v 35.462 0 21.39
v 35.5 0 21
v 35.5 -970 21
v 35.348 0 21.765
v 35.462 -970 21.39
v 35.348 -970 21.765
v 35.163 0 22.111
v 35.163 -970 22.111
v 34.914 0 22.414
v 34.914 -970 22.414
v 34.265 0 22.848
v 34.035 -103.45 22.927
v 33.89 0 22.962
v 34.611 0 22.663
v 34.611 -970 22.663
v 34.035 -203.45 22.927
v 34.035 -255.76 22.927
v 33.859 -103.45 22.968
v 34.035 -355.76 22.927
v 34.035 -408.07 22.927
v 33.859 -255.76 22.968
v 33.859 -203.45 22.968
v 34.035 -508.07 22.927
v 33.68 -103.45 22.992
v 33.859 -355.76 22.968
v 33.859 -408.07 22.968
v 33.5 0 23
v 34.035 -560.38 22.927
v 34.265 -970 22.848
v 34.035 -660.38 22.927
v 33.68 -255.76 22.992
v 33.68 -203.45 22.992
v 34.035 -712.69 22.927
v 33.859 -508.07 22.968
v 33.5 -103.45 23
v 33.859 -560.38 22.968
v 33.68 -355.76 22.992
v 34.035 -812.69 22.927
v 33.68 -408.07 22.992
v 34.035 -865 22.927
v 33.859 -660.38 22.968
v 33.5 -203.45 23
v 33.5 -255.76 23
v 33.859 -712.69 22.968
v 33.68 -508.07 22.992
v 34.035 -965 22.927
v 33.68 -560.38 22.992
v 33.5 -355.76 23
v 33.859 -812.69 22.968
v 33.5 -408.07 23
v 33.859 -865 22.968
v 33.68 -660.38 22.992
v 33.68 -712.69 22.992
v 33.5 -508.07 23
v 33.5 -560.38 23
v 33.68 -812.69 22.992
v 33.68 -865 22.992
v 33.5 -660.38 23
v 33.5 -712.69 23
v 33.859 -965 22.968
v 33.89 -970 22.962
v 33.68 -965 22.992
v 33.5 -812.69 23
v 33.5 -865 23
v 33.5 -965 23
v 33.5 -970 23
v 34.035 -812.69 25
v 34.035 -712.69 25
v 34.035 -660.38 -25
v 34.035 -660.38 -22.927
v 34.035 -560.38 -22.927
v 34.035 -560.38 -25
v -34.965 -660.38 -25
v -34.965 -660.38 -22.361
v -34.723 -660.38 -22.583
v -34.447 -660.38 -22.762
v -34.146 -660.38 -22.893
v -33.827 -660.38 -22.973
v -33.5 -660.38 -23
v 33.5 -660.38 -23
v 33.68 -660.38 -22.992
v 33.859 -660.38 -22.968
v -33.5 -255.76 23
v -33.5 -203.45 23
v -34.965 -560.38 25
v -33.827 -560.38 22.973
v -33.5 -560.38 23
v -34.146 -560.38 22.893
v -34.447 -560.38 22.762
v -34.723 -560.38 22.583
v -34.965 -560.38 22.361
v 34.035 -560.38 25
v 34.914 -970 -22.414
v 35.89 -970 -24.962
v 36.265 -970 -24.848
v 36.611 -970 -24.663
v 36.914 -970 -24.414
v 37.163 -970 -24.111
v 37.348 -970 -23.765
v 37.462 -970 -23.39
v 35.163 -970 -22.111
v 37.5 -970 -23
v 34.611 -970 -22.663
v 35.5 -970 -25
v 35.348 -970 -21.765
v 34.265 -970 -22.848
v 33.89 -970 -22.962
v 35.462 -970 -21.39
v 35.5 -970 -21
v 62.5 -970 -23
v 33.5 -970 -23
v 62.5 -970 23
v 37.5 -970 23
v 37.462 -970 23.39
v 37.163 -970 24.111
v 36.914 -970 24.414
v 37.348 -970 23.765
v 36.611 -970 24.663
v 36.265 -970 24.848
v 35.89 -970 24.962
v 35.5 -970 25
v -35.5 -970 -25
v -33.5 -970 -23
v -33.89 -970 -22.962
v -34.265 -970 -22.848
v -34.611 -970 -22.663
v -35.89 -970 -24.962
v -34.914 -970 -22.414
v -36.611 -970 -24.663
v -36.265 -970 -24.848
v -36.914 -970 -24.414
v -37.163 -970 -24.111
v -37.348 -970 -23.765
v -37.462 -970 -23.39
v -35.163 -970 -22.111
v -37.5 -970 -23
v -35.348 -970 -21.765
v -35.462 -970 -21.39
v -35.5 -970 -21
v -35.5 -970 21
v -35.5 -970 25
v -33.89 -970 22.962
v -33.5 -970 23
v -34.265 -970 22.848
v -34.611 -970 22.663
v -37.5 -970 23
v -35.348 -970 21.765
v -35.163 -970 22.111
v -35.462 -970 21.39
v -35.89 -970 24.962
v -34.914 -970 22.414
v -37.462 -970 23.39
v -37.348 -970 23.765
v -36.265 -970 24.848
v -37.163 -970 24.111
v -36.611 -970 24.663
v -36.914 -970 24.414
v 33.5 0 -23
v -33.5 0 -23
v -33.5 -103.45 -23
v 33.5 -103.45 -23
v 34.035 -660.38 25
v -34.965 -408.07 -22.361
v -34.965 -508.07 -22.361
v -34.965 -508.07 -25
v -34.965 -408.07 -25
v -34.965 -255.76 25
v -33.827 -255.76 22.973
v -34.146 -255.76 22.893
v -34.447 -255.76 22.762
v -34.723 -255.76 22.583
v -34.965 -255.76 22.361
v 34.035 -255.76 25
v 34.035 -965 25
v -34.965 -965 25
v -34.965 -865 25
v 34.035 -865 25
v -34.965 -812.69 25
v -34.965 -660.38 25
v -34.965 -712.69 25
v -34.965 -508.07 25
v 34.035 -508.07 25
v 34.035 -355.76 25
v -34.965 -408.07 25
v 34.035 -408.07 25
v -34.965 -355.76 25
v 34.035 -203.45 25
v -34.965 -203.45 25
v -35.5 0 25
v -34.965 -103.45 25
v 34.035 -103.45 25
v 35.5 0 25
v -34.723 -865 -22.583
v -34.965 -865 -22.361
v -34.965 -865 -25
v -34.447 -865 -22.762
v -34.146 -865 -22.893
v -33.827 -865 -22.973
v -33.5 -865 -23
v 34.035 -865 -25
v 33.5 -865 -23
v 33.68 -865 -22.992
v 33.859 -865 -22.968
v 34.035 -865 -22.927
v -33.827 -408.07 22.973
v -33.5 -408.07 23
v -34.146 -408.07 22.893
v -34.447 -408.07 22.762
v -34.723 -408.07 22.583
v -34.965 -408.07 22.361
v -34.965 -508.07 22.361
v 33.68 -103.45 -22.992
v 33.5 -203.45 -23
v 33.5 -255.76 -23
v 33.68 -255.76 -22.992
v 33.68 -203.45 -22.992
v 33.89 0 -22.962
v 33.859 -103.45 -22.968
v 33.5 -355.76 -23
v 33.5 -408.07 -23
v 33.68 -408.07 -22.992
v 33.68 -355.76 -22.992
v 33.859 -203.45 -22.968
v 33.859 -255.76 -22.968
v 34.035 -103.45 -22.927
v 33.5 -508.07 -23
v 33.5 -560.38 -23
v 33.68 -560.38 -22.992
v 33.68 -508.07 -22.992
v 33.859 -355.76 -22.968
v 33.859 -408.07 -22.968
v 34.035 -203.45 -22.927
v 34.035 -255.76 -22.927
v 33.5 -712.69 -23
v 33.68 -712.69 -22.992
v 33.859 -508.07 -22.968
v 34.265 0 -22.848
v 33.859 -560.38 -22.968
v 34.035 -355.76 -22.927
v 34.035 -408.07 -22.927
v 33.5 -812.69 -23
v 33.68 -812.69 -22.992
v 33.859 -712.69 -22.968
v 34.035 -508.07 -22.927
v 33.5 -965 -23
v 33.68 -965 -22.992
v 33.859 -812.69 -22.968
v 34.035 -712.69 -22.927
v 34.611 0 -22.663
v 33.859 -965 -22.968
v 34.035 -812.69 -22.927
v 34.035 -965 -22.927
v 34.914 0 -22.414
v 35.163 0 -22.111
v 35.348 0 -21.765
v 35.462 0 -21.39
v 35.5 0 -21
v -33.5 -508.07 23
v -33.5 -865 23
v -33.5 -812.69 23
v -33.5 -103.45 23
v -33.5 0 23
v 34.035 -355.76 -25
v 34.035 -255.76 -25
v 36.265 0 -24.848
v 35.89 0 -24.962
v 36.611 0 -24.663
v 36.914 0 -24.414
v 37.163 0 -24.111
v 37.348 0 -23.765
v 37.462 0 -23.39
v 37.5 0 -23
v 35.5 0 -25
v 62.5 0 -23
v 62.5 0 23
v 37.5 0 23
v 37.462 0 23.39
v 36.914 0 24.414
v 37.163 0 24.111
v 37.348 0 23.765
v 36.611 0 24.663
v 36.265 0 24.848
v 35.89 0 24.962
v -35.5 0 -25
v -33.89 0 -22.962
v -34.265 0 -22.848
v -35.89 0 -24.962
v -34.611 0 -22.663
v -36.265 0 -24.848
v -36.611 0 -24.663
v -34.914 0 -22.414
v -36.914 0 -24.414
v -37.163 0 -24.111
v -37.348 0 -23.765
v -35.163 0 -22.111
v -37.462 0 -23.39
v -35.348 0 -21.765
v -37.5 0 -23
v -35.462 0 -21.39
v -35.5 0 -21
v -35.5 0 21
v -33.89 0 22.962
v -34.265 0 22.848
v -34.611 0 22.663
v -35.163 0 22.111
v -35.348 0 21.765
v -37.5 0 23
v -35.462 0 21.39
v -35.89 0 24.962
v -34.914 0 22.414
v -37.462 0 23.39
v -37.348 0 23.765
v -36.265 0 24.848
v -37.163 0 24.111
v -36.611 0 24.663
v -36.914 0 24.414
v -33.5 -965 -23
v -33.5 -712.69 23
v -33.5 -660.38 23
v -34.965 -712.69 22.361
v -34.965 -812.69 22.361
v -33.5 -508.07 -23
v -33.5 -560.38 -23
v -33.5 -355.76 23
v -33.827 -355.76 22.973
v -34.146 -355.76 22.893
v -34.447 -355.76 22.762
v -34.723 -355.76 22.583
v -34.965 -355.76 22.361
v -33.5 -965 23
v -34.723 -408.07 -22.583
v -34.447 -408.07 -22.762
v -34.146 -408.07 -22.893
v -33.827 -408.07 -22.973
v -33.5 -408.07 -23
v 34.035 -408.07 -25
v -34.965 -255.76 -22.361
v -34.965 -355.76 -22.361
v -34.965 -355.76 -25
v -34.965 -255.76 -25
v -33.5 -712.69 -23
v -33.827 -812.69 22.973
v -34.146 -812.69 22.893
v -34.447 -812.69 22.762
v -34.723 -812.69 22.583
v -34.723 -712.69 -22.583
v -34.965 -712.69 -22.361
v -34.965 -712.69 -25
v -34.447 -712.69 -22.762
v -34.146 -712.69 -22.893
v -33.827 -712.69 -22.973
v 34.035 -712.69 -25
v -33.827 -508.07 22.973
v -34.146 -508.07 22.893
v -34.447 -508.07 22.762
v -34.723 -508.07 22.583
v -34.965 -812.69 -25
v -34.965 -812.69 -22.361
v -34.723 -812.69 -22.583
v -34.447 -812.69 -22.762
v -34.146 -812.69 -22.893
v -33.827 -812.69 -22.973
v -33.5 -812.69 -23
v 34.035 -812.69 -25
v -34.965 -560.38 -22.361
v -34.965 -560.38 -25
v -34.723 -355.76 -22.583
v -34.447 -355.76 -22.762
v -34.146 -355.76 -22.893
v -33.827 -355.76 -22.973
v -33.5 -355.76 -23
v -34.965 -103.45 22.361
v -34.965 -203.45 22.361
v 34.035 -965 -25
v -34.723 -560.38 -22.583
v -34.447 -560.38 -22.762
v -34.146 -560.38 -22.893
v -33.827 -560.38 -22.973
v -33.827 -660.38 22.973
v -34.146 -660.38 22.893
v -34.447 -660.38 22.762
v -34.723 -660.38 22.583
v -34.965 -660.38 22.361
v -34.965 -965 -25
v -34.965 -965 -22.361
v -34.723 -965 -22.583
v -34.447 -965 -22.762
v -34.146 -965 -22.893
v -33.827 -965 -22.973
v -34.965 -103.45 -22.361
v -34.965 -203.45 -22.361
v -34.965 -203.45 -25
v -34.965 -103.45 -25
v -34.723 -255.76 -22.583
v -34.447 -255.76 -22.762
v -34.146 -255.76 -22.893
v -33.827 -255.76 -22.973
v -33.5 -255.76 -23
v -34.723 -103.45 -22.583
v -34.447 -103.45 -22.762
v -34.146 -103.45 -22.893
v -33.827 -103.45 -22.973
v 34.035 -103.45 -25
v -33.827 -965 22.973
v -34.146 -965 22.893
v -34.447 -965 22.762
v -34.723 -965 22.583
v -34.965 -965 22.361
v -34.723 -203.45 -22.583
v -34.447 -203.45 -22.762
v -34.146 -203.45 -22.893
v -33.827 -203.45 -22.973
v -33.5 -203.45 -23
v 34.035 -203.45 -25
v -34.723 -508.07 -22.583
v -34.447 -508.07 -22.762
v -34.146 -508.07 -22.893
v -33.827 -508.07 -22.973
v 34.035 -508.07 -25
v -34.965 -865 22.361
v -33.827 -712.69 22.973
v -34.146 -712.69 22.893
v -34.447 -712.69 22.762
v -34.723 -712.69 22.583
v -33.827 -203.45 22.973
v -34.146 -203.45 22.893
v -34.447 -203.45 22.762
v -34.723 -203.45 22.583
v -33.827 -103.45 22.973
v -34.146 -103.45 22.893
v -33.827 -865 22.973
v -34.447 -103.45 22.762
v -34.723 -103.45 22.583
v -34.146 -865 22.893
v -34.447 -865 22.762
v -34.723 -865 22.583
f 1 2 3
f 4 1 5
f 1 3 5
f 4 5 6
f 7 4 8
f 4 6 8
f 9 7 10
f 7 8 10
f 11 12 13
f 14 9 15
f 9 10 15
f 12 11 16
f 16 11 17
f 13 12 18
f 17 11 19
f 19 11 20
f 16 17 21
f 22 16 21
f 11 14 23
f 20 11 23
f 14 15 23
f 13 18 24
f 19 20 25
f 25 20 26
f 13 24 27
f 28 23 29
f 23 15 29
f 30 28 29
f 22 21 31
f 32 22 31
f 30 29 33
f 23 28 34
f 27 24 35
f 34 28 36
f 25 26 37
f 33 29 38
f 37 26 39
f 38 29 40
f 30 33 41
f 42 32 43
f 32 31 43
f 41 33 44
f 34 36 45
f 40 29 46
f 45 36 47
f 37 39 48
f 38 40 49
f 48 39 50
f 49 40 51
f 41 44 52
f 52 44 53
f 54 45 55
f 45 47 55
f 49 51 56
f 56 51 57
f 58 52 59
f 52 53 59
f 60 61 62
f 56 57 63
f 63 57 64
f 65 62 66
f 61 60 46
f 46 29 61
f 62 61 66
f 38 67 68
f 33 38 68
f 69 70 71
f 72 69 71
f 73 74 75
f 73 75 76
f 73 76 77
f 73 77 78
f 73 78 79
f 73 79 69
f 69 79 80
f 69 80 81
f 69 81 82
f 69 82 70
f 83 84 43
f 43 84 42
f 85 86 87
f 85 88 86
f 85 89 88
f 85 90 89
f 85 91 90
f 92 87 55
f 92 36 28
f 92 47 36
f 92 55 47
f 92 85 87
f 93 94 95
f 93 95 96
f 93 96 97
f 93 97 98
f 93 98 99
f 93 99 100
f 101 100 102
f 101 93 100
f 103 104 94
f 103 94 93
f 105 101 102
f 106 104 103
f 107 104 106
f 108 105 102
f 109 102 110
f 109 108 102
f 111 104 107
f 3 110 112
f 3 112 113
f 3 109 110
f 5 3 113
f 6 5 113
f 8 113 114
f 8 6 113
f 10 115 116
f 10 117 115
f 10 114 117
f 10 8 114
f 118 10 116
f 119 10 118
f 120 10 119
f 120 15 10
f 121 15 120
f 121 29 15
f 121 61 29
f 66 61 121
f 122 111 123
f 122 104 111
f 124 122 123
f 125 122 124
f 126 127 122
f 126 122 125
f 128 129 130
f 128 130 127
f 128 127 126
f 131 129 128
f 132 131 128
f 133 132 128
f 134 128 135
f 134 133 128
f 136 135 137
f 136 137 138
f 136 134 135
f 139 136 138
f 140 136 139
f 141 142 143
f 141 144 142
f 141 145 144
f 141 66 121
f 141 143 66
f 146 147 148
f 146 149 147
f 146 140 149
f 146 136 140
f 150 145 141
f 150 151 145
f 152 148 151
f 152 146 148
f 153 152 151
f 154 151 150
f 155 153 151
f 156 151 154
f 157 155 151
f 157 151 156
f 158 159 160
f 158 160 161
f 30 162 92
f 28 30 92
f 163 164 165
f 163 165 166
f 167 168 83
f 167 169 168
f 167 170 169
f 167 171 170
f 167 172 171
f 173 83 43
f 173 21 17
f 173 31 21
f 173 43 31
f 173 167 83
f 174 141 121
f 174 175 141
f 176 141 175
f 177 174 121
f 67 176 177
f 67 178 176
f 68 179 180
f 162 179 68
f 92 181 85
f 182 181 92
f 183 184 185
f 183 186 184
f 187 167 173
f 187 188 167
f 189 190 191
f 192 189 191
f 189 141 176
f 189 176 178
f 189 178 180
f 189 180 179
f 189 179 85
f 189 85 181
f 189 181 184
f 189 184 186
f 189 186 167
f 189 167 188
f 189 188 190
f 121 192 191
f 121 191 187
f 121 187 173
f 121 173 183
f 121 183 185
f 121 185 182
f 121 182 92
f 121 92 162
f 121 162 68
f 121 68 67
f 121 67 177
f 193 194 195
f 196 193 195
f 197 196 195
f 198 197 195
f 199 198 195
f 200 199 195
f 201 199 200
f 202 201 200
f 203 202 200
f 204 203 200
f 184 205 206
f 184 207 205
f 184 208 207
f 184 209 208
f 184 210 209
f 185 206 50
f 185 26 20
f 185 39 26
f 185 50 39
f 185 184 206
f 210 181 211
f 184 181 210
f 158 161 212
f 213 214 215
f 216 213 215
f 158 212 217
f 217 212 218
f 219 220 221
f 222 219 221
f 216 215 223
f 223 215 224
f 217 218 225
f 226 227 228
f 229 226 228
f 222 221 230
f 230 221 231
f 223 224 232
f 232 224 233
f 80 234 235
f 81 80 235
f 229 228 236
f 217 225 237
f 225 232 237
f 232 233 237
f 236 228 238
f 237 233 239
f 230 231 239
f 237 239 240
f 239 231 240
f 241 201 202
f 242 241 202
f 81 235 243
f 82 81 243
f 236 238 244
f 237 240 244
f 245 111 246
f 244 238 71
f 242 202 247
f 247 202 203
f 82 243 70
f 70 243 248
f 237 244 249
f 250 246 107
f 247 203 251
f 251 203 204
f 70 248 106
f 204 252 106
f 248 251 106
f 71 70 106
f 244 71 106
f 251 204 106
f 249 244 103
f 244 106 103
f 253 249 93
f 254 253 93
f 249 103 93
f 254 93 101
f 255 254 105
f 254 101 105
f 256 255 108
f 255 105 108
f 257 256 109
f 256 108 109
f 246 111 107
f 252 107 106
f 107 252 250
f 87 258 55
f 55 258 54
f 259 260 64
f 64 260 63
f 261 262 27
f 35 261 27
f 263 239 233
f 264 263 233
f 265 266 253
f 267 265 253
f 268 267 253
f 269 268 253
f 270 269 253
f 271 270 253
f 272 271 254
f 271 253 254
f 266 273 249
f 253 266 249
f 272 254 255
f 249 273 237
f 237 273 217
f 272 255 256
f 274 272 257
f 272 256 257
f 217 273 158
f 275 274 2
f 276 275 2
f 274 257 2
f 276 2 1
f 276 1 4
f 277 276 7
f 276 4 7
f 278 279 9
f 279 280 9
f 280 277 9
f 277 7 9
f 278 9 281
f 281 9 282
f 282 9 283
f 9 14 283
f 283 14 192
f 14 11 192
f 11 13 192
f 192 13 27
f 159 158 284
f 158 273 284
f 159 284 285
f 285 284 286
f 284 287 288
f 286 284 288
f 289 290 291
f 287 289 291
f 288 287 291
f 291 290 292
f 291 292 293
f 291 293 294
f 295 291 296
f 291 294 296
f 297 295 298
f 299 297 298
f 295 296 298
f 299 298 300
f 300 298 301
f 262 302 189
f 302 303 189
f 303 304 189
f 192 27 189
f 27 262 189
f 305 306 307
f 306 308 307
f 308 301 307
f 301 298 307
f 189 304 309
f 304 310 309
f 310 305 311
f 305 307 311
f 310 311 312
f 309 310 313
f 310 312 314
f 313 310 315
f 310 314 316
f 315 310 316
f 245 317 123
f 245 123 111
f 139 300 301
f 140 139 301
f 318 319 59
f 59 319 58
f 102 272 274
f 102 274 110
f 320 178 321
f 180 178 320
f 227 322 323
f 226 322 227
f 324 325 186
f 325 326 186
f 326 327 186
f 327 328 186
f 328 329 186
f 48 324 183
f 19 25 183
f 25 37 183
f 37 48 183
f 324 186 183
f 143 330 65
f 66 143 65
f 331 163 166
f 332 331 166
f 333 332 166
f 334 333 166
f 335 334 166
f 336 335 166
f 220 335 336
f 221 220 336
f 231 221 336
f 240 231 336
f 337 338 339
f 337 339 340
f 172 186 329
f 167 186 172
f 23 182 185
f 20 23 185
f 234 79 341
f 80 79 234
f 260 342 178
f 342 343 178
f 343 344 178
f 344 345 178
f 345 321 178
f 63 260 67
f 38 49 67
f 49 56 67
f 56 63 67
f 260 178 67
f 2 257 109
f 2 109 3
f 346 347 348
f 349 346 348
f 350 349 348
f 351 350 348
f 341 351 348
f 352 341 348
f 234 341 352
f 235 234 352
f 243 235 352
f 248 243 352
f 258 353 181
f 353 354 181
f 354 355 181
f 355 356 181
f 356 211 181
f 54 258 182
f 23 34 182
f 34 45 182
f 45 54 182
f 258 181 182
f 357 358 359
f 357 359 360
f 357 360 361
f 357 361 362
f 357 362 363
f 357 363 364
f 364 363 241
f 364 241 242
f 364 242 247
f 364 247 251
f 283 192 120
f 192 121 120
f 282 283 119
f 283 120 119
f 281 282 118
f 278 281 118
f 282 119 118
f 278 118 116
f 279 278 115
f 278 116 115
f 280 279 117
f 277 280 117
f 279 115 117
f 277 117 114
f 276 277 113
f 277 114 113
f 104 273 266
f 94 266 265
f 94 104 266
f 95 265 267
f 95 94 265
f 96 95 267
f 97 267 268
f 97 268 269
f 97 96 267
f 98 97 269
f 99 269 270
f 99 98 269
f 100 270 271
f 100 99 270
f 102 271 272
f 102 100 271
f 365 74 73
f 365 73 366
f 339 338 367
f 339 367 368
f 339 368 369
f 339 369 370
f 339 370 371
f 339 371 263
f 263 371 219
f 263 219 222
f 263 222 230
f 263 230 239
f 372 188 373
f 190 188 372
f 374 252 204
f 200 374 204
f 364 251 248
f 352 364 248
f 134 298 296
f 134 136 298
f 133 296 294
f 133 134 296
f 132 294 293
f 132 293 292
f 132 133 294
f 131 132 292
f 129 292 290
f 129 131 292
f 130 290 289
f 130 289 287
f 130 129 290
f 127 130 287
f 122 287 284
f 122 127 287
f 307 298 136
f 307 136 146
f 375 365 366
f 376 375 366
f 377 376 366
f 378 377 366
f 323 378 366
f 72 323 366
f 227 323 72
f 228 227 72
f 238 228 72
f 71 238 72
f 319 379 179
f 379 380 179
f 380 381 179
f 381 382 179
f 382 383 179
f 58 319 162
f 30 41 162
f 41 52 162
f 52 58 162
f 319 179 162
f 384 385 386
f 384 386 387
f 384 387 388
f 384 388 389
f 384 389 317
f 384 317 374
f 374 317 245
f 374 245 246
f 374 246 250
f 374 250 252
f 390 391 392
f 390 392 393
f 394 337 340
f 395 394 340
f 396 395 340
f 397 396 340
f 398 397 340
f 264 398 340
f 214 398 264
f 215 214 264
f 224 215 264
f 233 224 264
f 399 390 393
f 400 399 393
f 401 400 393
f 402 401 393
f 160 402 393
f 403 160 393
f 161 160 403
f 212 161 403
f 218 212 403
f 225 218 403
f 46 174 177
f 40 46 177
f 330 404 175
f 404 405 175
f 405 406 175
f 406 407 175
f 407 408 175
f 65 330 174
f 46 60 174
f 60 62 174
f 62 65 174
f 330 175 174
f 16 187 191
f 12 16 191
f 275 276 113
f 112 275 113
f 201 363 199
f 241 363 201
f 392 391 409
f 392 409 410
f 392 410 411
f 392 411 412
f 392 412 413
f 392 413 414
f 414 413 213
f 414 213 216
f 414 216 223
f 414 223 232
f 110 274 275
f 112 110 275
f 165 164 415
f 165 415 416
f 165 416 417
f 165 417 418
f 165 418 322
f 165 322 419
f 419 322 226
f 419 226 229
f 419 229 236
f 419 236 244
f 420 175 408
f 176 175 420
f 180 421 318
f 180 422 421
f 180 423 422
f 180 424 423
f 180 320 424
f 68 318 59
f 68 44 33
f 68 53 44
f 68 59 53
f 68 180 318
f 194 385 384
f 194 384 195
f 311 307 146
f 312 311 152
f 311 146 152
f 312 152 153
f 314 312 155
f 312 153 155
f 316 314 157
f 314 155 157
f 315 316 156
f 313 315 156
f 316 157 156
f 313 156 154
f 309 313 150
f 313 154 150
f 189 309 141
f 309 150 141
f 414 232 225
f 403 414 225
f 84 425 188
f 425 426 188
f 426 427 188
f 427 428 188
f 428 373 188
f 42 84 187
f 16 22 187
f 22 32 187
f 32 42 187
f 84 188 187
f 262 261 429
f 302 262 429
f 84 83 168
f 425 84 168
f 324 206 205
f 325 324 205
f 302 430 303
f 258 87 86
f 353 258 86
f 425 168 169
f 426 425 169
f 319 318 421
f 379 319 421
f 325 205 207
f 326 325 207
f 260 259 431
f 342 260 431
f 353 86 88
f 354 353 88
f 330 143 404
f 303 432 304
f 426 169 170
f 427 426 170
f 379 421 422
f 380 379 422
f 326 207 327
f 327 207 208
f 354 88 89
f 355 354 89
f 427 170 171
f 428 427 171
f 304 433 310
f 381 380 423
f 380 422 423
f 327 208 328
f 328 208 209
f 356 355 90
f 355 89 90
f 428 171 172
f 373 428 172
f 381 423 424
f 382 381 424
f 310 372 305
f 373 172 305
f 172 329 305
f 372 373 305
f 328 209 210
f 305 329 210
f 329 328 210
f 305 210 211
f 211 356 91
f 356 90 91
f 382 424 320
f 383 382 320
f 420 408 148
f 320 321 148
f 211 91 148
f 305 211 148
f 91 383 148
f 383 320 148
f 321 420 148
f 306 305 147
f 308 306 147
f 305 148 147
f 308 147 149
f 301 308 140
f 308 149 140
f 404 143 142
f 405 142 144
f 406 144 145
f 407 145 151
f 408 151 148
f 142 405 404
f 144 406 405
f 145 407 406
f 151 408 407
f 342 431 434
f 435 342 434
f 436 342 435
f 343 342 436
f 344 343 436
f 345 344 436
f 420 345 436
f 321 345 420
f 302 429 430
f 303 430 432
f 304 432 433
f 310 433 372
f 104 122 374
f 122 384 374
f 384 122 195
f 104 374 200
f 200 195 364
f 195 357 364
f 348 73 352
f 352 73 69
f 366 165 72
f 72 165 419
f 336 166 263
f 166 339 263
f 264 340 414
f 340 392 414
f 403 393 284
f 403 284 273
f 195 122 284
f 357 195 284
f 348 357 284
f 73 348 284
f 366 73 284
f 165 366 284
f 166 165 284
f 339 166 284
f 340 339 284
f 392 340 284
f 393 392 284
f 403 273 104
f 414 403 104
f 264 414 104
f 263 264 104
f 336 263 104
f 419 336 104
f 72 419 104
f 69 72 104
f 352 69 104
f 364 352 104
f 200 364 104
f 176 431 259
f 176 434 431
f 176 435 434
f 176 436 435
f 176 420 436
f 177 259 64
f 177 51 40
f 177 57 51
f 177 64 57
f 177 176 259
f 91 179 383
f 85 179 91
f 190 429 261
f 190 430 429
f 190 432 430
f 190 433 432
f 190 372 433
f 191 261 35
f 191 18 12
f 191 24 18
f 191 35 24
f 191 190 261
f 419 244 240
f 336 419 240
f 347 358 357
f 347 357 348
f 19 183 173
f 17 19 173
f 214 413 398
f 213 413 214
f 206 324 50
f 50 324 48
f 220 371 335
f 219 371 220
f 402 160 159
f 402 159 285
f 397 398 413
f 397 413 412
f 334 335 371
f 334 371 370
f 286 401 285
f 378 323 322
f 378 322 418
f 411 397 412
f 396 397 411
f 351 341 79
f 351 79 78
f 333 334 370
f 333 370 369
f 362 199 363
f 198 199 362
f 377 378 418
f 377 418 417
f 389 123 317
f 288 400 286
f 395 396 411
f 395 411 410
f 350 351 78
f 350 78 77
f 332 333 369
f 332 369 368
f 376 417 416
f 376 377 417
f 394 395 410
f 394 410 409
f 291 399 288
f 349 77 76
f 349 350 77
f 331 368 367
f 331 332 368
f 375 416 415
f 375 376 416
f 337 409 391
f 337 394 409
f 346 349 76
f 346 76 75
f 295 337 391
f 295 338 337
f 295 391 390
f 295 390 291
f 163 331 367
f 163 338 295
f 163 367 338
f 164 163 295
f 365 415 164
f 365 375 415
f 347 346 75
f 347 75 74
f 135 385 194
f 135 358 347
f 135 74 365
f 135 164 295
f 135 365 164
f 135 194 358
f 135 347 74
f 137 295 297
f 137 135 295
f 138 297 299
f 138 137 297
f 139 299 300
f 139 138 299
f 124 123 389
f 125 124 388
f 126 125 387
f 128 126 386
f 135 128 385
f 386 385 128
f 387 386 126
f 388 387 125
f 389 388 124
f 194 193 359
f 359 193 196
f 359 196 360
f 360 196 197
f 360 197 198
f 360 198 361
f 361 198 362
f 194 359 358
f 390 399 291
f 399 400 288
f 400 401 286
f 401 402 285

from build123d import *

# Parameters (mm, degrees)
F0_W     = 75
F0_H     = 50
F0_W_2   = 71
F0_H_2   = 46
F1_DEPTH = 970
F3_R     = 2
F4_R     = 2
F2_W     = 69
F2_H     = 100
F5_DEPTH = 60
F6_DEPTH = 25


with BuildPart() as f1:
    # F0 (on Front) → F1 (new body)
    with BuildSketch(Plane.XZ):
        Rectangle(F0_W, F0_H)
        Rectangle(F0_W_2, F0_H_2, mode=Mode.SUBTRACT)
    extrude(amount=F1_DEPTH)

    # F3
    f3_edges = [f1.edges().sort_by_distance(p)[0] for p in [
        (-37.5, -485, 25),
        (37.5, -485, 25),
        (37.5, -485, -25),
        (-37.5, -485, -25),
    ]]
    fillet(f3_edges, radius=F3_R)

    # F4
    f4_edges = [f1.edges().sort_by_distance(p)[0] for p in [
        (-35.5, -485, 23),
        (-35.5, -485, -23),
        (35.5, -485, -23),
        (35.5, -485, 23),
    ]]
    fillet(f4_edges, radius=F4_R)

    # F2 (on face) → F5 (cut)
    with BuildSketch(Plane.XY.offset(25)):
        with Locations((-0.4652442876, -915)):
            Rectangle(F2_W, F2_H)
        with Locations((-0.4652442876, -762.69)):
            Rectangle(F2_W, F2_H)
        with Locations((-0.4652442876, -610.38)):
            Rectangle(F2_W, F2_H)
        with Locations((-0.4652442876, -458.07)):
            Rectangle(F2_W, F2_H)
        with Locations((-0.4652442876, -305.76)):
            Rectangle(F2_W, F2_H)
        with Locations((-0.4652442876, -153.45)):
            Rectangle(F2_W, F2_H)
    extrude(amount=-F5_DEPTH, mode=Mode.SUBTRACT)

    # F6 (add): a face of the model
    f6_faces = [f1.faces().sort_by_distance(p)[0] for p in [
        (37.5, -485, 0),
    ]]
    extrude(f6_faces, amount=F6_DEPTH)


solid = f1.part
